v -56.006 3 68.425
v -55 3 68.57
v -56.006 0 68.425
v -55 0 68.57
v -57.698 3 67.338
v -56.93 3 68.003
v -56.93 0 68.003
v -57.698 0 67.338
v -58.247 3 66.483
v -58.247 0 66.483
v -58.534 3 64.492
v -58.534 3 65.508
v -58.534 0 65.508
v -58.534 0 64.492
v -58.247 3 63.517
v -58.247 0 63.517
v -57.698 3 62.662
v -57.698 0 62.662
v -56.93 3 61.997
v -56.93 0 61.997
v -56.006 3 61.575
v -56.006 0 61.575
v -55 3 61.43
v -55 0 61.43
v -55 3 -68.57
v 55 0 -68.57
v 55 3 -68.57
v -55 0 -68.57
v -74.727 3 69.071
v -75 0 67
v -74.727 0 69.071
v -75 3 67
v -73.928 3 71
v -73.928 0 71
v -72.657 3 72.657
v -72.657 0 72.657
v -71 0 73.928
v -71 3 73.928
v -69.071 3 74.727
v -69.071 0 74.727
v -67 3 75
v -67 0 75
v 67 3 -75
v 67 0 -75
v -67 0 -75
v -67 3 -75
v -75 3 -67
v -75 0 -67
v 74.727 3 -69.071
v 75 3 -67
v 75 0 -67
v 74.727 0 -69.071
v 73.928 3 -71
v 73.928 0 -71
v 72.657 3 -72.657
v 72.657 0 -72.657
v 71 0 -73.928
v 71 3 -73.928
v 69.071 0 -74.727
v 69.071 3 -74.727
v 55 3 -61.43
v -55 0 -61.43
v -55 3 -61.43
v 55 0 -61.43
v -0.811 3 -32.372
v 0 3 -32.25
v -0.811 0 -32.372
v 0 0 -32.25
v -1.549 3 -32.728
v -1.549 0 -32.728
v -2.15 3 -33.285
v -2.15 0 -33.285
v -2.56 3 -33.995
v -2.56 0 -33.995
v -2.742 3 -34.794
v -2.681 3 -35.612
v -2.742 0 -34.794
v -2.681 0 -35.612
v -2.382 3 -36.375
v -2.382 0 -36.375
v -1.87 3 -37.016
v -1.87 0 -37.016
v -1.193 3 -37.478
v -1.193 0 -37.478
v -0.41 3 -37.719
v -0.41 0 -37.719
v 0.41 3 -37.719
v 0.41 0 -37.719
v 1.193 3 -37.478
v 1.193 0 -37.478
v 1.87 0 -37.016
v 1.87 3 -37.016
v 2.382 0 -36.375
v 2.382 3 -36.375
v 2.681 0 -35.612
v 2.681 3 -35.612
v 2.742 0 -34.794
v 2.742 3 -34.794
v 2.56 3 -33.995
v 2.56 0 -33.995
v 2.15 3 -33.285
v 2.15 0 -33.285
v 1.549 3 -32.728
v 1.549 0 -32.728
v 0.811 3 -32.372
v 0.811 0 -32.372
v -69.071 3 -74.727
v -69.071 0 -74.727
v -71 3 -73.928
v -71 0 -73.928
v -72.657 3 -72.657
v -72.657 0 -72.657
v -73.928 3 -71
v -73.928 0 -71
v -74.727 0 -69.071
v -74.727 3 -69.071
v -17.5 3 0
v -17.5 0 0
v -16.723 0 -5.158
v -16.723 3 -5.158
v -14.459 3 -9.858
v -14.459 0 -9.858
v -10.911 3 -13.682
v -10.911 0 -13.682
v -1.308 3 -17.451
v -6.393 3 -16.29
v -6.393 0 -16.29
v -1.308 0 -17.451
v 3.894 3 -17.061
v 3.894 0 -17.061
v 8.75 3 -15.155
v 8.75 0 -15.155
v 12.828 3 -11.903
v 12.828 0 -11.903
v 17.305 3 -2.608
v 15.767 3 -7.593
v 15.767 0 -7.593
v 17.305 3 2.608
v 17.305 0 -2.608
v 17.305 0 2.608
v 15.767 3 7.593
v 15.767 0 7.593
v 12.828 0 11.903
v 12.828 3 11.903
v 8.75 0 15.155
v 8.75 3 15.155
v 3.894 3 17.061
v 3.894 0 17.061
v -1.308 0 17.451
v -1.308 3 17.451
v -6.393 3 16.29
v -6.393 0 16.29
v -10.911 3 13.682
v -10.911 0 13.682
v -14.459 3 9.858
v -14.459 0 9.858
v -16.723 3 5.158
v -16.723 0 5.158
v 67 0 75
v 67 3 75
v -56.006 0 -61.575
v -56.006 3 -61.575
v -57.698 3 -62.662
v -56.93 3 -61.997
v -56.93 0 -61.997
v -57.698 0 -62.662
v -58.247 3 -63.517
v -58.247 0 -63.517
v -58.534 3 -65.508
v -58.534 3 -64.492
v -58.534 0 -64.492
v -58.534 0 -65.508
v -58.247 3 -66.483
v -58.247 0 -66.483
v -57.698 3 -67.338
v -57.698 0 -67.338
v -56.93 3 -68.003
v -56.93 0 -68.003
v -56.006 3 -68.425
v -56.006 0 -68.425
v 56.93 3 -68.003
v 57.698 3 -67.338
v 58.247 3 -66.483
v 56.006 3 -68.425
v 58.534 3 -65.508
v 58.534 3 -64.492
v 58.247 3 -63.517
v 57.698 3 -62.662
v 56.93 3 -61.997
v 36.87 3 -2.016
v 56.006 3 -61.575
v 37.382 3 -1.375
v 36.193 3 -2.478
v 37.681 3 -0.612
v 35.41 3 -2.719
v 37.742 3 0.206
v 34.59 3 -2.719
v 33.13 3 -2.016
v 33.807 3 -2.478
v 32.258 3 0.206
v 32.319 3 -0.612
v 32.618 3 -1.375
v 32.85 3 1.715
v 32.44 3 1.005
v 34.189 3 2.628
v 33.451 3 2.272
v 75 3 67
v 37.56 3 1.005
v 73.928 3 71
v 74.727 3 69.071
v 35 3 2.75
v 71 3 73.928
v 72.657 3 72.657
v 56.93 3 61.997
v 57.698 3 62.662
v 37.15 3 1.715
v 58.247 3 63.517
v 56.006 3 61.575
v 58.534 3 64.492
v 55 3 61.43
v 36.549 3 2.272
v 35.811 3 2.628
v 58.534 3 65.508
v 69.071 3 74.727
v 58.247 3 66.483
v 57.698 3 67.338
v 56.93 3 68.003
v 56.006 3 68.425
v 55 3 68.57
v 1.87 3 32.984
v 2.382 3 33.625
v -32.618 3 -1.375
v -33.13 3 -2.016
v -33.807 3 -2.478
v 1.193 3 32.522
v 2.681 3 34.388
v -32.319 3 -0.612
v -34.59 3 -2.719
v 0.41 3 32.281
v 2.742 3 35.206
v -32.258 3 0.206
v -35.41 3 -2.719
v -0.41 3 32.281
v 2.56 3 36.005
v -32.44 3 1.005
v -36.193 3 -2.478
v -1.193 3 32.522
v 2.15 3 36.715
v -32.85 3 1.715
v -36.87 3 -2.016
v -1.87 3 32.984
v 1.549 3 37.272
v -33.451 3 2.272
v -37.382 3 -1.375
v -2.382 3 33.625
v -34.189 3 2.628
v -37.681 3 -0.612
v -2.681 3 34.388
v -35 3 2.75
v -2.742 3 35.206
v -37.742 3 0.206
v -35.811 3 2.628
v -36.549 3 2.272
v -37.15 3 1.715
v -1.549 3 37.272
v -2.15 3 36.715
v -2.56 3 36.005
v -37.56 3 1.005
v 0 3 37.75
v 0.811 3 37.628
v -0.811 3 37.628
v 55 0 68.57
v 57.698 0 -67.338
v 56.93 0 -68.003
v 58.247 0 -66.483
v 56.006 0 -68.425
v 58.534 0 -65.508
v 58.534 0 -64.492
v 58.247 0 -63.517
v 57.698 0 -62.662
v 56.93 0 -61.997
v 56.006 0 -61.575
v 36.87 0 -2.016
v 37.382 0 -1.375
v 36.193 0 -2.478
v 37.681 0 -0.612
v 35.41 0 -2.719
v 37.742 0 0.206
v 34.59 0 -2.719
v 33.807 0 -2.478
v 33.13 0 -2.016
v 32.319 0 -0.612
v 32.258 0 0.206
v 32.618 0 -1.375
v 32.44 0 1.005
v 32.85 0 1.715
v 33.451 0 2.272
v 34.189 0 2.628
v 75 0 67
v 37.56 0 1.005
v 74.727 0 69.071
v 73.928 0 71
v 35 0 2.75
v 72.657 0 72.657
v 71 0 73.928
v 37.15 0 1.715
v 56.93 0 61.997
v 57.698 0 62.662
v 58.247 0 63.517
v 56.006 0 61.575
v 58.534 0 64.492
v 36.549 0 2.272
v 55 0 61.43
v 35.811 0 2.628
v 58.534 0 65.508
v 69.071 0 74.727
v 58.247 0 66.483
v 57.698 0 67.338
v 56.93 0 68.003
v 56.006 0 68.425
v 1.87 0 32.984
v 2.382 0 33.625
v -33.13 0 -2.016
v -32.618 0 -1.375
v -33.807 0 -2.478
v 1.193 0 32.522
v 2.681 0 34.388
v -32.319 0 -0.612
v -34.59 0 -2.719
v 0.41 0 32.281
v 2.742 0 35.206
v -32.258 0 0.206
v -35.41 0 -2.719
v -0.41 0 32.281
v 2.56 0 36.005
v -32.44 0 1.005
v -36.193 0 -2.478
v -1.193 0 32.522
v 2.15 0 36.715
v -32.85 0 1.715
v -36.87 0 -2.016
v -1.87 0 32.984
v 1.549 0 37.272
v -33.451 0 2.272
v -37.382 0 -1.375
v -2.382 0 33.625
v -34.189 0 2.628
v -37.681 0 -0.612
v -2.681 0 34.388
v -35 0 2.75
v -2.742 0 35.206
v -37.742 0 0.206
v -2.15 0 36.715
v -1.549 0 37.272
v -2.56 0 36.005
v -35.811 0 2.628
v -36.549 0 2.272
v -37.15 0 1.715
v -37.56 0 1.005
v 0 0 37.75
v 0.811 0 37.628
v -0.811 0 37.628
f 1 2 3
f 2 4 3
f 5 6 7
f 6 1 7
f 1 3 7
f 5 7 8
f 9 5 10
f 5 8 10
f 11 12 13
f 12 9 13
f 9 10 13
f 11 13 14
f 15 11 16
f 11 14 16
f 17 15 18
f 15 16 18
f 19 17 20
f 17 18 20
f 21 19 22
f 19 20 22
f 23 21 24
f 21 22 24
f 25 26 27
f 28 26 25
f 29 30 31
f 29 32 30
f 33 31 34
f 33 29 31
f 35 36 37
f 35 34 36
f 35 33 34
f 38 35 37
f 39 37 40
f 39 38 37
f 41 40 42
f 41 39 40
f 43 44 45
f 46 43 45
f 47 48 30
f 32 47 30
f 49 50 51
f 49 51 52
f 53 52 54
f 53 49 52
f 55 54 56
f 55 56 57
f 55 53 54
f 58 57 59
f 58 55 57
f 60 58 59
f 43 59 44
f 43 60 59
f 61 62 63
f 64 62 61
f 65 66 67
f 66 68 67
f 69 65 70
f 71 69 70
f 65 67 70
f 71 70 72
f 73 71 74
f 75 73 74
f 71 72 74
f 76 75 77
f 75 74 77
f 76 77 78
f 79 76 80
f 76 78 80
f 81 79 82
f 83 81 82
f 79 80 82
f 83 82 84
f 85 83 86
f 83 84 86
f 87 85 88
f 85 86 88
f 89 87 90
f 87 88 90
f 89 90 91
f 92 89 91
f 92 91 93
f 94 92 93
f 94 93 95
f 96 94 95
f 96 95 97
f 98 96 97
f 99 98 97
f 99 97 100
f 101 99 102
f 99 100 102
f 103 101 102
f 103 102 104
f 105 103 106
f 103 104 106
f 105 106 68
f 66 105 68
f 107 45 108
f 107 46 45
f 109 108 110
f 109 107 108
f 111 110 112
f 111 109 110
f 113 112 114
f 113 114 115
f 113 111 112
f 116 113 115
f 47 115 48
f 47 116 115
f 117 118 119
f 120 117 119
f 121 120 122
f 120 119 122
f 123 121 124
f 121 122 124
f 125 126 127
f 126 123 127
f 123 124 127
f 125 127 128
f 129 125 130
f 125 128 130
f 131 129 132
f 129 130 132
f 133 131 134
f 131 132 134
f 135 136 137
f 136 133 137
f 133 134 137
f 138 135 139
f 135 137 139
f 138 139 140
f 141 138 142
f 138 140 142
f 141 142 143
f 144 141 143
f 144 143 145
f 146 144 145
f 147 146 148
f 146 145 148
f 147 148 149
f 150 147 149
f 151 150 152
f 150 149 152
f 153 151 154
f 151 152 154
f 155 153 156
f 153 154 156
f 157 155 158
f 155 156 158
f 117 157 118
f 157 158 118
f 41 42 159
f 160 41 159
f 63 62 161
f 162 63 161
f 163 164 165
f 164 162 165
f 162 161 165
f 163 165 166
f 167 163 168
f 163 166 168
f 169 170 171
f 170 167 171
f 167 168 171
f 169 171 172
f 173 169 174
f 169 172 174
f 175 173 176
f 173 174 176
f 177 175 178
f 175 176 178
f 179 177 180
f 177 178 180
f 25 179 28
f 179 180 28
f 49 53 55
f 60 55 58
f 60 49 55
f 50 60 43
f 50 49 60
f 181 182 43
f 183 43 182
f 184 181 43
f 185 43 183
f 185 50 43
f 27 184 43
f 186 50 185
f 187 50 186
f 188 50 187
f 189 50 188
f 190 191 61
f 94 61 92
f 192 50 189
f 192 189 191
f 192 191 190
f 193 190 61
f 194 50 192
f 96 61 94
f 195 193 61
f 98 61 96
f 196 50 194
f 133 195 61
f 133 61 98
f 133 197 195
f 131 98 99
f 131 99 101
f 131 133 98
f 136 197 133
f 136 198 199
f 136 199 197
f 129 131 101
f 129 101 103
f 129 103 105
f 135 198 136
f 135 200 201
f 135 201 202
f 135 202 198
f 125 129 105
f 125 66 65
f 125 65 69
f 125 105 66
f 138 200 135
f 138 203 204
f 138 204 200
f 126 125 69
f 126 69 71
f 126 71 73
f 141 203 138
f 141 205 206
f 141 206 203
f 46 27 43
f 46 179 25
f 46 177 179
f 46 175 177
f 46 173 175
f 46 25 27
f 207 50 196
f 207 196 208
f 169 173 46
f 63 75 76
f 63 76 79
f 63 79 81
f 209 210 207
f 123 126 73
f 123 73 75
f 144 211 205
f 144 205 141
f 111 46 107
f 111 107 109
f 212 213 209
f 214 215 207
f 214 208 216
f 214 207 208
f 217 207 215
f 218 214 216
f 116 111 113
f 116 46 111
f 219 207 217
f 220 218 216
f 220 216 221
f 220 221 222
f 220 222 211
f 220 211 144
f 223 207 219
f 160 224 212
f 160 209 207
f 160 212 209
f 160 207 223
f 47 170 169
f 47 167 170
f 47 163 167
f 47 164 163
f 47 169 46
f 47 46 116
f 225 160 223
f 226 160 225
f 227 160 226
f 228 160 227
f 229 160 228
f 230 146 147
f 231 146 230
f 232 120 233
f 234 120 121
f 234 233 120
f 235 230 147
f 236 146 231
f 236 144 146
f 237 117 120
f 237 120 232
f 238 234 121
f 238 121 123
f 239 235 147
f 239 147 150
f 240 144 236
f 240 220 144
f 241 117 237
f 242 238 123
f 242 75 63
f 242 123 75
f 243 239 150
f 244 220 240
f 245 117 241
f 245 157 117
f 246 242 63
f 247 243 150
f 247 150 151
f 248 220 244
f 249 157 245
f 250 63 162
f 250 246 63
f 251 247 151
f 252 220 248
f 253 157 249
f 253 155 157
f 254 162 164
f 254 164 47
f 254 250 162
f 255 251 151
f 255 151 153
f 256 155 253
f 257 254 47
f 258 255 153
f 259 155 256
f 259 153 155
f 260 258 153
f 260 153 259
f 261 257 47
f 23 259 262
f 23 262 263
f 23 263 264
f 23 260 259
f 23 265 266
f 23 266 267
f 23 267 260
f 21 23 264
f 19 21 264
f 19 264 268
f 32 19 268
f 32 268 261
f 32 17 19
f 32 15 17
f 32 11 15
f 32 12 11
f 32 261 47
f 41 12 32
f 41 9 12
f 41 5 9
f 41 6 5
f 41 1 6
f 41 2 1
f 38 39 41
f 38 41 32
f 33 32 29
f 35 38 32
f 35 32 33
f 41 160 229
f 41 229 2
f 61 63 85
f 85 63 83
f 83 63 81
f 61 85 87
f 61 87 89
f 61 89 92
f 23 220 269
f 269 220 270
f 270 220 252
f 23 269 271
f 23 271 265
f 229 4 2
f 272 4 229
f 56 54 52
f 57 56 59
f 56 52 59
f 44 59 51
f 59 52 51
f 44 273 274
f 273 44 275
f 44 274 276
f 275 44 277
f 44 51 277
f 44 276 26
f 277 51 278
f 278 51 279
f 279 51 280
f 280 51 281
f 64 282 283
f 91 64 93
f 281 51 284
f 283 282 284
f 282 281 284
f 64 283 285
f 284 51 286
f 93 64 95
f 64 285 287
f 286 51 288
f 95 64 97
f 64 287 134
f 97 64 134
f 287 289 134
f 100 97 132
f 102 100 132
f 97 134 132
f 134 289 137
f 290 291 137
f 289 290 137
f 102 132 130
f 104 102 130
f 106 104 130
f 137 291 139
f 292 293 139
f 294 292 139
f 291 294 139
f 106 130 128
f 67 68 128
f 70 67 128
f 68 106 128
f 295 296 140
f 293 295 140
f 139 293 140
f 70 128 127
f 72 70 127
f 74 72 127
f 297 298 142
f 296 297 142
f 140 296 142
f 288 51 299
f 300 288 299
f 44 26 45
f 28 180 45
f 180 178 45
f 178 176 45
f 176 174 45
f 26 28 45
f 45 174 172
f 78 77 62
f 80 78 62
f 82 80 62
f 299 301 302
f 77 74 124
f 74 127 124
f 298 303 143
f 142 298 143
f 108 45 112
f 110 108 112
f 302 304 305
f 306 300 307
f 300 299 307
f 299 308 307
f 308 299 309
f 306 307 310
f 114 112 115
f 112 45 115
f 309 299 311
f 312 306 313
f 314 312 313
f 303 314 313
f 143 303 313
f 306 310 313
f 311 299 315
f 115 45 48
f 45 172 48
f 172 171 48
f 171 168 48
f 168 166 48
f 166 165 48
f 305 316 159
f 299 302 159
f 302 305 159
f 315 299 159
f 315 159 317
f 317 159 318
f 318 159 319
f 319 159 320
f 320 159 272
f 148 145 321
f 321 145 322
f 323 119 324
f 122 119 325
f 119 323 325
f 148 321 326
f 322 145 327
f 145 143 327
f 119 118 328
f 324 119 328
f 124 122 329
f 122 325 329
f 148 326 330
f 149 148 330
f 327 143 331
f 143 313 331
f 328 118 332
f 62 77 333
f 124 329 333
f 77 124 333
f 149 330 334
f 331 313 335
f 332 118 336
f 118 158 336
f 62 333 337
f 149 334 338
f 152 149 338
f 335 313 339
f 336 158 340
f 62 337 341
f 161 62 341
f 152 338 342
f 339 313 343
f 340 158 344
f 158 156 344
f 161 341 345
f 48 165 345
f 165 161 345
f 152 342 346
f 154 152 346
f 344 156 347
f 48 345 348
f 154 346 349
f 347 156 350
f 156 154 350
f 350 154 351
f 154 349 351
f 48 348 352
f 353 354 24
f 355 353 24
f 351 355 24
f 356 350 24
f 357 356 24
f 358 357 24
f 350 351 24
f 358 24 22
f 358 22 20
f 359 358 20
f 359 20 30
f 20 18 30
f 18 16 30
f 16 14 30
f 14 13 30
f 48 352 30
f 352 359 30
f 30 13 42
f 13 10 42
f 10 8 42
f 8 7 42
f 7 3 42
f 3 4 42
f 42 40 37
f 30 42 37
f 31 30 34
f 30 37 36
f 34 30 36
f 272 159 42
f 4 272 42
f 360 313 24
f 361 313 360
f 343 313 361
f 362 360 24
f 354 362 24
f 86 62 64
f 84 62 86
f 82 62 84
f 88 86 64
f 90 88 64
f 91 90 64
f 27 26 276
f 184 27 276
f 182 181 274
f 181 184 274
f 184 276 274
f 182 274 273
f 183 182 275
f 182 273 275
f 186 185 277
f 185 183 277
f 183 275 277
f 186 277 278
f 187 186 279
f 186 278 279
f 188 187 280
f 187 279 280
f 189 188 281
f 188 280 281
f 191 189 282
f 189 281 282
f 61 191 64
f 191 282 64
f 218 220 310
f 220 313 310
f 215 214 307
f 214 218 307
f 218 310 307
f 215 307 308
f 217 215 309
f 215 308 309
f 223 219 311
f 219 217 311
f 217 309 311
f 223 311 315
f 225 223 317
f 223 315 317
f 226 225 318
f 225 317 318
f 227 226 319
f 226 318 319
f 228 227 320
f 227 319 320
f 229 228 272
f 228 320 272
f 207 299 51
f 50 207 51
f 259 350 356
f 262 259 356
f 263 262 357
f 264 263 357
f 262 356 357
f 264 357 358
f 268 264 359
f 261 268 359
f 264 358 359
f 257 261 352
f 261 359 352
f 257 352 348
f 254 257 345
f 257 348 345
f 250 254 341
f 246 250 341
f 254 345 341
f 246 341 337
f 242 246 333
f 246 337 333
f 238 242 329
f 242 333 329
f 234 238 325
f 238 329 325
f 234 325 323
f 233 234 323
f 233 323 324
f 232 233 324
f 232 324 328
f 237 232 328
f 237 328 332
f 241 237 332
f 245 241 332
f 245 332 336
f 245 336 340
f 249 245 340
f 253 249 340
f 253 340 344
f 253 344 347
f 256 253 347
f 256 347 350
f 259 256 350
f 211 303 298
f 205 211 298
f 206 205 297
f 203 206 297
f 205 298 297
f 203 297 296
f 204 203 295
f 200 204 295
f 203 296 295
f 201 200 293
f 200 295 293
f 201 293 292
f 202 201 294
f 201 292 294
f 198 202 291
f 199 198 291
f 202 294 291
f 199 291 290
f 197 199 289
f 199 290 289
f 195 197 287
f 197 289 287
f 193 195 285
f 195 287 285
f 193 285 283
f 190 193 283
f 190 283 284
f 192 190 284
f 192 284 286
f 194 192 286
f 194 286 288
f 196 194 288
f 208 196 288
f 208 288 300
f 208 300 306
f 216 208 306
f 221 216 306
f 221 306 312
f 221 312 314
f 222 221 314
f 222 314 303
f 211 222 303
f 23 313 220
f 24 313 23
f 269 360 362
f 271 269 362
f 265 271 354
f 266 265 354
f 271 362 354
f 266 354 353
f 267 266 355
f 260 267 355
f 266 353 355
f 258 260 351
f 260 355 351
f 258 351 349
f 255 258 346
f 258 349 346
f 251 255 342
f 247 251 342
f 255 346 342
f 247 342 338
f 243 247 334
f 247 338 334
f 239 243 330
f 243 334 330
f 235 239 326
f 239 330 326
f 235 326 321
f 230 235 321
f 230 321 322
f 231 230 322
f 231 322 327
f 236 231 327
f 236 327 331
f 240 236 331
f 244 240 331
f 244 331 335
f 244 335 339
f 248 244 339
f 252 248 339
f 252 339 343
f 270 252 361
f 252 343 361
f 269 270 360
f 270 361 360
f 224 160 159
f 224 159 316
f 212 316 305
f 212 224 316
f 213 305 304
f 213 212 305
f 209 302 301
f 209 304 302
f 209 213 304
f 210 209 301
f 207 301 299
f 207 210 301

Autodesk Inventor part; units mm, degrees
ref_plane "YZ Plane" through (0, 0, 0) normal (1, 0, 0) x (0, 1, 0)
ref_plane "XZ Plane" through (0, 0, 0) normal (0, 1, 0) x (-1, 0, 0)
ref_plane "XY Plane" through (0, 0, 0) normal (0, 0, 1) x (1, 0, 0)
sketch "Sketch1" plane through (0, 0, 0) normal (0, 1, 0) x (-1, 0, 0)
  line L0 (-75, -75) -> (75, -75)
  line L1 (75, -75) -> (75, 75)
  line L2 (75, 75) -> (-75, 75)
  line L3 (-75, 75) -> (-75, -75)
  line L4 (-75, -75) -> (75, 75) construction
  line L5 (75, -75) -> (-75, 75) construction
  circle A0 centre (0, 0) radius 17.5
  line L6 (65, 65) -> (65, -65) construction
  line L7 (65, -65) -> (-65, -65) construction
  line L8 (-65, -65) -> (-65, 65) construction
  line L9 (-65, 65) -> (65, 65) construction
  line L10 (75, 65) -> (55, 65) construction
  line L11 (55, 65) -> (55, -65) construction
  line L12 (-75, 65) -> (-55, 65) construction
  line L13 (-55, 65) -> (-55, -65) construction
  line L14 (-55, 65) -> (55, 65) construction
  line L15 (-55, 61.43) -> (55, 61.43)
  line L16 (55, 68.57) -> (-55, 68.57)
  arc A1 (-55, 68.57) -> (-55, 61.43) centre (-55, 65) ccw
  arc A2 (55, 61.43) -> (55, 68.57) centre (55, 65) ccw
  line L17 (-55, -65) -> (55, -65) construction
  line L18 (-55, -68.57) -> (55, -68.57)
  line L19 (55, -61.43) -> (-55, -61.43)
  arc A3 (-55, -61.43) -> (-55, -68.57) centre (-55, -65) ccw
  arc A4 (55, -68.57) -> (55, -61.43) centre (55, -65) ccw
  point P0 (0, 65)
  point P1 (0, -65)
  dimension "d0" = 150
  dimension "d1" = 150
  dimension "d2" = 35
  dimension "d3" = 10
  dimension "d4" = 20
  dimension "d5" = 20
  dimension "d6" = 7.14
  dimension "d7" = 7.14
extrude "Extrusion1" add sketch "Sketch1" along normal blind 3
sketch "Sketch2" plane through (0, 3, 0) normal (0, 1, 0) x (1, 0, 0)
  circle A0 centre (0, 0) radius 35 construction
  line L0 (0, 0) -> (35, 0) construction
  line L1 (35, 0) -> (0, 35) construction
  line L2 (0, 35) -> (-35, 0) construction
  line L3 (-35, 0) -> (0, -35) construction
  line L4 (0, -35) -> (35, 0) construction
  dimension "d21" = 70
hole "Hole1" at (0, 3, 35) at (35, 3, 0) at (0, 3, -35) at (-35, 3, 0) direction (0, -1, 0) diameter 5.5 end through all clearance for "Hex Head Bolt" size "M5" standard "Ansi Metric M Profile"
fillet "Fillet1" radius 8 4 edges at (-75, 1.5, -75) (-75, 1.5, 75) (75, 1.5, 75) (75, 1.5, -75)
properties part number "BaseTopPlate" material "Aluminum"
